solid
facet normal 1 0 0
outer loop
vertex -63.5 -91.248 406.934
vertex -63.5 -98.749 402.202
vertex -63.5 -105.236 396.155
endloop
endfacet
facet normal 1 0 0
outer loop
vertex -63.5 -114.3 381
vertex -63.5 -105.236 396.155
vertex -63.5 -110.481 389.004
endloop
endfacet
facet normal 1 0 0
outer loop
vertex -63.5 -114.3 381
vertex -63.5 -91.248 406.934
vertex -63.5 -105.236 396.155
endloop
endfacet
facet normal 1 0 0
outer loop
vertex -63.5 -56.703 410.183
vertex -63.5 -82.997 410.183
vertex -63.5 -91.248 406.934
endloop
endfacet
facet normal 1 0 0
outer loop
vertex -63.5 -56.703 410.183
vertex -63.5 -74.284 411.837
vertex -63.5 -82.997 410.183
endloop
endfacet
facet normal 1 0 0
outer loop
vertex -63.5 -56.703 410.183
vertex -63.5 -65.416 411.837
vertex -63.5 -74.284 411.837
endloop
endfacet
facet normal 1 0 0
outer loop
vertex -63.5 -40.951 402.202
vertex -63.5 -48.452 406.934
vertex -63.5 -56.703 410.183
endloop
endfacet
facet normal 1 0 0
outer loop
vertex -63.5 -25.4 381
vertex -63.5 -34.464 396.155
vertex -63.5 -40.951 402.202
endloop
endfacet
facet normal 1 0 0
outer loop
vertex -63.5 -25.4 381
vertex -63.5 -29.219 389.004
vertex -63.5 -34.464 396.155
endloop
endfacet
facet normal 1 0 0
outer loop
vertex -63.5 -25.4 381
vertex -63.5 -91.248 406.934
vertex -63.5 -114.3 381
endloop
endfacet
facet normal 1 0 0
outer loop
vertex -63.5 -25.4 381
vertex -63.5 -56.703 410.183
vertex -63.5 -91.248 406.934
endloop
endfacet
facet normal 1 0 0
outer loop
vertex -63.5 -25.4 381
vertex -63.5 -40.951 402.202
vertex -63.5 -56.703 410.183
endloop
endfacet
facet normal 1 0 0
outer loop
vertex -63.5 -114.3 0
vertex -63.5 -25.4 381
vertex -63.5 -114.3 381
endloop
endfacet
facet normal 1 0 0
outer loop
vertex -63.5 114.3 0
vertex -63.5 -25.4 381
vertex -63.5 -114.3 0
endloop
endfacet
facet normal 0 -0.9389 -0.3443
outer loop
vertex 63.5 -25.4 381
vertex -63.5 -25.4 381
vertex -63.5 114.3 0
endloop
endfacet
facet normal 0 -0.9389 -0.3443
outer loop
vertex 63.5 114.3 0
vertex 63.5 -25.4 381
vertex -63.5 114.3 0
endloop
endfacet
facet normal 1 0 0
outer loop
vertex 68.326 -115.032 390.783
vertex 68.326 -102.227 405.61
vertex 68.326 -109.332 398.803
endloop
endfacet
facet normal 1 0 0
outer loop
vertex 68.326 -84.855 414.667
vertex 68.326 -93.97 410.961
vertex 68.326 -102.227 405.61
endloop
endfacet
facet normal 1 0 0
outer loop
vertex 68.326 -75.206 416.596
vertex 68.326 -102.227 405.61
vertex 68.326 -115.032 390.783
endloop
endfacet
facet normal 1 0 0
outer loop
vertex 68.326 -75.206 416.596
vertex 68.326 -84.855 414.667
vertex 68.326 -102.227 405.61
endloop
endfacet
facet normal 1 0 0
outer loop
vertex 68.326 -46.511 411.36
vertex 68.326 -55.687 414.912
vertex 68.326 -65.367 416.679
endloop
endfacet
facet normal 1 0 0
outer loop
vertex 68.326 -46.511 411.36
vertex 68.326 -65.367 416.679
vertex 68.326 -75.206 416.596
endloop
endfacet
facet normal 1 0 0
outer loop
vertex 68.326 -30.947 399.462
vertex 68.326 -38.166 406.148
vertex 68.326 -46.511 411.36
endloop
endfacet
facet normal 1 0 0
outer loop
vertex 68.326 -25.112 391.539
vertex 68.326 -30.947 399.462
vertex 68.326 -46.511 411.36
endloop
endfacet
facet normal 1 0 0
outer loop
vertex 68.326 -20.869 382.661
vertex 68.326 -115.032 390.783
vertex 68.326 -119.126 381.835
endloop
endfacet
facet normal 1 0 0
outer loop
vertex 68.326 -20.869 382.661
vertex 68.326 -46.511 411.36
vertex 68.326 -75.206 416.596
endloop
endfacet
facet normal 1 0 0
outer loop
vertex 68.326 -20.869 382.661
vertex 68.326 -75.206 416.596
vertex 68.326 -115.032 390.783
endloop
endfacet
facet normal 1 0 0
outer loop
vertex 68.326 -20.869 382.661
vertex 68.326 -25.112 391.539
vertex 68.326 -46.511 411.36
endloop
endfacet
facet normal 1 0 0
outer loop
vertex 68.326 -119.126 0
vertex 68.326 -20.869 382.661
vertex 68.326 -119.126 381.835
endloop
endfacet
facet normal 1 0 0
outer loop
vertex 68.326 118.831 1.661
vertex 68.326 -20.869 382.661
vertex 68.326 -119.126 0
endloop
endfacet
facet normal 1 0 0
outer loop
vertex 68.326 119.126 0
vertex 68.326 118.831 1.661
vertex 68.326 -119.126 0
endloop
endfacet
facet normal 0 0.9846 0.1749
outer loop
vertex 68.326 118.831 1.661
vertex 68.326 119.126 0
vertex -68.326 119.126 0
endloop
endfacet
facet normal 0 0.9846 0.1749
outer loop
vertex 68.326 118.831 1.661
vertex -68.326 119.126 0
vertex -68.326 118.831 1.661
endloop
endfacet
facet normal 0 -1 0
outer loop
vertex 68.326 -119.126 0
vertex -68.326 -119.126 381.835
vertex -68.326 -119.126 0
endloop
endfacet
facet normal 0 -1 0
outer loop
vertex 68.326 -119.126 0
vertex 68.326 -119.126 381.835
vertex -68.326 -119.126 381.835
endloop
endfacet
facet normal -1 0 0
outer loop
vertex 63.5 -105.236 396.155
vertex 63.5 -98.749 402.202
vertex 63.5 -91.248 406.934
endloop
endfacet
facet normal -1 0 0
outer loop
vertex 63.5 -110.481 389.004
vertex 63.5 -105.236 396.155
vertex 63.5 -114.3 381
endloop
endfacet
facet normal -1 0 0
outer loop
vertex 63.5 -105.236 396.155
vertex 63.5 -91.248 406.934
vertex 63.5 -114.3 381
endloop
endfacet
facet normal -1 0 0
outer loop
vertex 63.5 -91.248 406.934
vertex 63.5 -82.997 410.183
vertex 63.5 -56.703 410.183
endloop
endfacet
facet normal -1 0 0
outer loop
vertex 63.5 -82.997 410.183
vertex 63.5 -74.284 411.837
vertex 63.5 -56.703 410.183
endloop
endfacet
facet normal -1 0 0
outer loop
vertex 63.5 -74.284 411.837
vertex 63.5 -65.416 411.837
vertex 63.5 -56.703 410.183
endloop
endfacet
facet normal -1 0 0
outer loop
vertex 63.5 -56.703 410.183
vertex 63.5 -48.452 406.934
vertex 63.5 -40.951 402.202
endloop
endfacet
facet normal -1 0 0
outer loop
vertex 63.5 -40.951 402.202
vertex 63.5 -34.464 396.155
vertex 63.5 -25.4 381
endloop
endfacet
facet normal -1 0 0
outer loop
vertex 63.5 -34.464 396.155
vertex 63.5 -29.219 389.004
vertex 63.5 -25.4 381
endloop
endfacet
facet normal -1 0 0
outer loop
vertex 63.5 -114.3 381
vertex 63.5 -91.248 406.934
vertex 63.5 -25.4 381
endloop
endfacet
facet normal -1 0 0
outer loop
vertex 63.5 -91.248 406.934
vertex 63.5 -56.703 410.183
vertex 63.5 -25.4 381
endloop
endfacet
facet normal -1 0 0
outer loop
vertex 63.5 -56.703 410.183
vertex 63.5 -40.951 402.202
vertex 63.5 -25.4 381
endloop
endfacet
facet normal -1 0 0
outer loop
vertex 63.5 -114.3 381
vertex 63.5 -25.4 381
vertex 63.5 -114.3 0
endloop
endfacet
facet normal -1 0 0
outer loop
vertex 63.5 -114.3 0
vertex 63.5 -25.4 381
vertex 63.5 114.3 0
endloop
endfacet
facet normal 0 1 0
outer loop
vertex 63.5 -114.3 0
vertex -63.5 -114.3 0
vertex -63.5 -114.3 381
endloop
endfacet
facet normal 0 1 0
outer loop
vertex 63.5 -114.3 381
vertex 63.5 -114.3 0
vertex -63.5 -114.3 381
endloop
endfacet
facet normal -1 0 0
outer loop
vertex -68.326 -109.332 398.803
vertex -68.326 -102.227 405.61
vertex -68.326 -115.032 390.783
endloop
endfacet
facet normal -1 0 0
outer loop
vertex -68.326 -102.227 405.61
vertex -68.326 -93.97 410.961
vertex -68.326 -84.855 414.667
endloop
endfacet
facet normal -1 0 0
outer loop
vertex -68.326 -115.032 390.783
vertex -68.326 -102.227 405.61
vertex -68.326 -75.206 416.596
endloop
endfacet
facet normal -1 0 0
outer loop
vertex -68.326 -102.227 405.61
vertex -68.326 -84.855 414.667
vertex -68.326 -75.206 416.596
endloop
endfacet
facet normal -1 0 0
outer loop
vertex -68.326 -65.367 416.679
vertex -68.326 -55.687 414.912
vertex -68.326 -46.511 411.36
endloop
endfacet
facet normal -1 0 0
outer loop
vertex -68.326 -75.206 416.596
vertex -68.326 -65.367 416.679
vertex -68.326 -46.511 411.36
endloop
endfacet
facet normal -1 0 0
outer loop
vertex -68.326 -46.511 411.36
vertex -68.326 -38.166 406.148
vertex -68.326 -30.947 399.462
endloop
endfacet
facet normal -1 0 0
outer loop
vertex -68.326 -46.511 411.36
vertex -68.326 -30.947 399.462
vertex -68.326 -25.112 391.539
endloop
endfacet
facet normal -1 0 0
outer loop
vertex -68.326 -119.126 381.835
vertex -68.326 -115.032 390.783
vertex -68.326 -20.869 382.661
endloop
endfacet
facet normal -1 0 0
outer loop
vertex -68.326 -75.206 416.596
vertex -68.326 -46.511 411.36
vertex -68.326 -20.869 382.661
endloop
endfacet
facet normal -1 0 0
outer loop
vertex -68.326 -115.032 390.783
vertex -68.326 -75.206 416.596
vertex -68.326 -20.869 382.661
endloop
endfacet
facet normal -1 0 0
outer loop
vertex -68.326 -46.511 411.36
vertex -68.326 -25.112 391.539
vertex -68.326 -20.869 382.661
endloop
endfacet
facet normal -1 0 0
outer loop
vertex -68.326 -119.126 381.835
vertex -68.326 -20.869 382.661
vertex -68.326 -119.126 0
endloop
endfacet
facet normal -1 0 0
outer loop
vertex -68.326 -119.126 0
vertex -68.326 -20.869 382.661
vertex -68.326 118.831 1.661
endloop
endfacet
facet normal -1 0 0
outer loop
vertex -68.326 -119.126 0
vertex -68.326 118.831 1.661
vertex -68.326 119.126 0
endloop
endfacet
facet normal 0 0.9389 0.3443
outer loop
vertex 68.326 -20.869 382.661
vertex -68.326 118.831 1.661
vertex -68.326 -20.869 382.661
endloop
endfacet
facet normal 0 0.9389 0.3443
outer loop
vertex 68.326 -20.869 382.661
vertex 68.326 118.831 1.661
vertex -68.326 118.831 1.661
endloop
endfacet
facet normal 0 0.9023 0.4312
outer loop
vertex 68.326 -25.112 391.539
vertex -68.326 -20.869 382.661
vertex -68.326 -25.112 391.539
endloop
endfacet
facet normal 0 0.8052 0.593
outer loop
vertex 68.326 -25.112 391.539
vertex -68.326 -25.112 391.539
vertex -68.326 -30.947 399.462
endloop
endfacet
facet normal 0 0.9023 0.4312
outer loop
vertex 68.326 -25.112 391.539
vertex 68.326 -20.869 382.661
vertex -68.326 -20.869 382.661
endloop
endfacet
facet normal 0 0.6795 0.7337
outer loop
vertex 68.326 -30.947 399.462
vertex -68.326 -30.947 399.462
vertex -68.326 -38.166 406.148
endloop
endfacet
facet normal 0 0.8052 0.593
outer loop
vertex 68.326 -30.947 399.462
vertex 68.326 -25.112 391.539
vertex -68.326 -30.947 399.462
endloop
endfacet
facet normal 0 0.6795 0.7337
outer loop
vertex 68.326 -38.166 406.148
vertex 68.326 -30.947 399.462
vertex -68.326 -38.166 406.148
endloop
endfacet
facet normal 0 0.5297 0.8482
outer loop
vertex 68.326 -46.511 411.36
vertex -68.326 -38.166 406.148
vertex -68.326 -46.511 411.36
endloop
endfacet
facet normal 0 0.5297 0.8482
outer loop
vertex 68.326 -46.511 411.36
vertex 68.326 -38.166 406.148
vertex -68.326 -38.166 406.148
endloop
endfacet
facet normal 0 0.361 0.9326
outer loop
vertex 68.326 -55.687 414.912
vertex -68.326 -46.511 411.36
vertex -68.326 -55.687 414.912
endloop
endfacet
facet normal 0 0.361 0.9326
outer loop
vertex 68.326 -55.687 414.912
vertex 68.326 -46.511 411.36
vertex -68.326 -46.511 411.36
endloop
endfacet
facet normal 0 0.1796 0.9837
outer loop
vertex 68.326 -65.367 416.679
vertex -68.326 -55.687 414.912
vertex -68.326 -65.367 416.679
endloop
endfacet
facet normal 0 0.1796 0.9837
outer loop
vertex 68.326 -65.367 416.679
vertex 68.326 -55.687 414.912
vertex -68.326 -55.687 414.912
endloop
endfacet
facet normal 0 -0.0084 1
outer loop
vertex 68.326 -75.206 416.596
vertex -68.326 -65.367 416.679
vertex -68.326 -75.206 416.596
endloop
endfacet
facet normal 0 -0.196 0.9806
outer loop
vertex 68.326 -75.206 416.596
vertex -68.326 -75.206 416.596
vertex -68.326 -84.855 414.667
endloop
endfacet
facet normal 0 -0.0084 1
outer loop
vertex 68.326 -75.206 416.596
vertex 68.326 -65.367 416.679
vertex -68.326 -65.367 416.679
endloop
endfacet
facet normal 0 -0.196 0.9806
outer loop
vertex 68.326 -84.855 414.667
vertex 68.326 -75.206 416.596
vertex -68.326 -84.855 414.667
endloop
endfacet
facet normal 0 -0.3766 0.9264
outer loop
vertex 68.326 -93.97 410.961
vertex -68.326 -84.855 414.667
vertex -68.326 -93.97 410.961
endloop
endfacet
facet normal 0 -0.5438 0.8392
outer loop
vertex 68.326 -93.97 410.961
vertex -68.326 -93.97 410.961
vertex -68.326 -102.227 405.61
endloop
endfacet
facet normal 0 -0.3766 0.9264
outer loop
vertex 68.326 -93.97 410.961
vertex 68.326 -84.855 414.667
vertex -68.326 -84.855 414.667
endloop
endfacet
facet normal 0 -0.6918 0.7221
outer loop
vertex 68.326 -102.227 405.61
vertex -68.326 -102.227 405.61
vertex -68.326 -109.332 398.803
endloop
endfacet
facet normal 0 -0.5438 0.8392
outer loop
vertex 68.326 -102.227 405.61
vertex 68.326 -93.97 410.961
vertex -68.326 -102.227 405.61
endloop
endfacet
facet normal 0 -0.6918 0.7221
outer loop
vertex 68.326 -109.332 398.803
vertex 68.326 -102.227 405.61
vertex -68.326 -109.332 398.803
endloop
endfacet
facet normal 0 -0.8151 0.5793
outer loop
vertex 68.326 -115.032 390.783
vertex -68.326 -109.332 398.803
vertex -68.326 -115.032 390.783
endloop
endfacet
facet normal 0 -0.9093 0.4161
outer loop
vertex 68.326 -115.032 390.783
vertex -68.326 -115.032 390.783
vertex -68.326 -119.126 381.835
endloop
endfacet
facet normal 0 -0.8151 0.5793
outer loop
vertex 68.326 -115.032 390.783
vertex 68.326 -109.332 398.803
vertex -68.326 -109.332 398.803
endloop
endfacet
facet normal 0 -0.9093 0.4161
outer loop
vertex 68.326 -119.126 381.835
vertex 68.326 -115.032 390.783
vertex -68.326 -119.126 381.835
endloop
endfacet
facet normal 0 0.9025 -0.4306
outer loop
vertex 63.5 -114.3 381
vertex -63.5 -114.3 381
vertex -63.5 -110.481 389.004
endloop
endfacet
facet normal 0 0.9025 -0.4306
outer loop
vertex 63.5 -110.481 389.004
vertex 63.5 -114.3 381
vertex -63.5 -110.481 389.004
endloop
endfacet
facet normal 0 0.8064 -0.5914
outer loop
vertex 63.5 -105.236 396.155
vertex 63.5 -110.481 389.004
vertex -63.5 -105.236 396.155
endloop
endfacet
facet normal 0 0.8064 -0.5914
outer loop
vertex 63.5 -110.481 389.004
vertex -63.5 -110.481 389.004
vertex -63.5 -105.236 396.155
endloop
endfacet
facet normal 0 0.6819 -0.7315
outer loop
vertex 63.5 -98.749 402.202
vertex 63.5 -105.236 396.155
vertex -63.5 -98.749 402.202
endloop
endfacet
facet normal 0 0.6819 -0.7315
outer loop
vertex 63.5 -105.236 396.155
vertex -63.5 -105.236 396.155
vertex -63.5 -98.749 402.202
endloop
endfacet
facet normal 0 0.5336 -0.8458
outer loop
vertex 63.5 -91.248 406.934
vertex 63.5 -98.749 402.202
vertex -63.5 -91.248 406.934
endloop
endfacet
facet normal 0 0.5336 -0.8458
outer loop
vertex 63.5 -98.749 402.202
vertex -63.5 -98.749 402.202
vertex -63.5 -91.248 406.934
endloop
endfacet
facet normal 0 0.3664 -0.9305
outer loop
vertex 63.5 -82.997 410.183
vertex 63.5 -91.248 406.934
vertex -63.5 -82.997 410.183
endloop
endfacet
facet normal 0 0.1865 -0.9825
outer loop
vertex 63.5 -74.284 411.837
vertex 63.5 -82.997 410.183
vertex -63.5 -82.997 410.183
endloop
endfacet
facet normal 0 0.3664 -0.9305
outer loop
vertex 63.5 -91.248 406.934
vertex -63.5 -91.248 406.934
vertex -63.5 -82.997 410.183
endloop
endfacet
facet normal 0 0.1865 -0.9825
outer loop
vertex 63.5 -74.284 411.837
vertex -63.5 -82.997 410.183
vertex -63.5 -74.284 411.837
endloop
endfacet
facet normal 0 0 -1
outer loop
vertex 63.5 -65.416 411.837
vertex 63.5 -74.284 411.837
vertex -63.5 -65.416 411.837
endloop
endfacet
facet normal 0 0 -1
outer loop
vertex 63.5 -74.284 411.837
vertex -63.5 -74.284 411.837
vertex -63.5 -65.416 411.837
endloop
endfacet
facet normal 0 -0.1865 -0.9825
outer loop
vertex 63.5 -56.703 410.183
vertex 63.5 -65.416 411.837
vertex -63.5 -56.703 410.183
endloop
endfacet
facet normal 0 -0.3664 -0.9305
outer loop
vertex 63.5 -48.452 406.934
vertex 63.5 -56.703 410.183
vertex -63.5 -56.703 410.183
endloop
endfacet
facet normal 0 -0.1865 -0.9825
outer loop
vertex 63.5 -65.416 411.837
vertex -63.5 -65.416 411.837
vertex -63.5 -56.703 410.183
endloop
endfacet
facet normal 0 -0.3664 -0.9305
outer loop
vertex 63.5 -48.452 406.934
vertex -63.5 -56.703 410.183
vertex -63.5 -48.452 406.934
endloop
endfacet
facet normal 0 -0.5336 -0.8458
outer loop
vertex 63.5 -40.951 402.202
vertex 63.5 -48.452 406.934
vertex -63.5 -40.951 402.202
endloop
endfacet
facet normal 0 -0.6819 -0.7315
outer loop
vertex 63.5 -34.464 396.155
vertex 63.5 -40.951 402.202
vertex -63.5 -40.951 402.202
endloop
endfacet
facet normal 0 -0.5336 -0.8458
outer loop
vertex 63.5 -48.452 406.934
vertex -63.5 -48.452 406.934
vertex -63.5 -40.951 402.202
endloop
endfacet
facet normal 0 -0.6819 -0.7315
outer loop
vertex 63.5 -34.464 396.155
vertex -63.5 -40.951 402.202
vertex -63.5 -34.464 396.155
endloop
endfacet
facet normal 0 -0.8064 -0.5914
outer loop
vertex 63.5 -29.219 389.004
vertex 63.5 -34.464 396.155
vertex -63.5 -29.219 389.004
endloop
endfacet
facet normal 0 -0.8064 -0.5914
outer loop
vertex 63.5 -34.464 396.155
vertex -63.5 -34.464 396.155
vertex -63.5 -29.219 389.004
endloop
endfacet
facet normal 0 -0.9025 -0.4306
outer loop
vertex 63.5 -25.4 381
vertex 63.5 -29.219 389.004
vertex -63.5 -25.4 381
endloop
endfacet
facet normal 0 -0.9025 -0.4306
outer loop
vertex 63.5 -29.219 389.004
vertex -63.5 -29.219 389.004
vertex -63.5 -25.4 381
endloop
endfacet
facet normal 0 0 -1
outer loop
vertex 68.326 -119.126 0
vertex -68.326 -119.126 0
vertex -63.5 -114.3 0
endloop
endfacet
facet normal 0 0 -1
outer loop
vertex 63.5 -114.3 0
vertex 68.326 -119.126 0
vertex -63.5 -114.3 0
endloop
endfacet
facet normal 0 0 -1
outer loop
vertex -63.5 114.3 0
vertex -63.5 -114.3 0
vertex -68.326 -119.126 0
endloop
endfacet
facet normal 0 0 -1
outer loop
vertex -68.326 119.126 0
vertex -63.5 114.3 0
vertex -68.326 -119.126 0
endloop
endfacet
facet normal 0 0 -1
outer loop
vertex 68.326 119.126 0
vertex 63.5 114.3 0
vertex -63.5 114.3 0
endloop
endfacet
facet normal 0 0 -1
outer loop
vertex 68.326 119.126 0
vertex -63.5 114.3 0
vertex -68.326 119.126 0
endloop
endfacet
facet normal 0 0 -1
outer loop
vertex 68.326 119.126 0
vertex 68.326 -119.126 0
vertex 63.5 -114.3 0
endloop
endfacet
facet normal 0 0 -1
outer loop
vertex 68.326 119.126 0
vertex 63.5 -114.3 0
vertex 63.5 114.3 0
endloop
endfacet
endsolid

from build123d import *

# Parameters (mm, degrees)
BOSS_EXTRUDE1_DEPTH      = 63.5
BOSS_EXTRUDE1_DEPTH_BACK = 63.5
BOSS_EXTRUDE2_DEPTH      = 4.826


with BuildPart() as part:
    # Sketch1 → Boss-Extrude1 (new, two sides: drawn at the far end of the back side and taken through both)
    with BuildSketch(Plane(origin=(0, 0, 0), x_dir=(0, 0, -1), z_dir=(1, 0, 0)).offset(-BOSS_EXTRUDE1_DEPTH_BACK)):
        with BuildLine():
            Line((0, -114.3), (-381, -114.3))
            ThreePointArc((-381, -114.3), (-412.045495931, -69.85), (-381, -25.4))
            Line((-381, -25.4), (0, 114.3))
            Line((0, 114.3), (0, 119.126))
            Line((0, 119.126), (-1.661372937, 118.8310171))
            Line((-1.661372937, 118.8310171), (-382.661372937, -20.8689829))
            ThreePointArc((-382.661372937, -20.8689829), (-416.86965301, -70.288504669), (-381.835461036, -119.126))
            Line((-381.835461036, -119.126), (0, -119.126))
            Line((0, -119.126), (0, -114.3))
        make_face()
    extrude(amount=BOSS_EXTRUDE1_DEPTH + BOSS_EXTRUDE1_DEPTH_BACK)

    # Sketch2 → Boss-Extrude2 (add)
    with BuildSketch(Plane(origin=(63.5, 0, 0), x_dir=(0, 0, -1), z_dir=(1, 0, 0))):
        with BuildLine():
            Line((-381.835461036, -119.126), (0, -119.126))
            Line((0, -119.126), (0, 119.126))
            Line((0, 119.126), (-1.661372937, 118.8310171))
            Line((-1.661372937, 118.8310171), (-382.661372937, -20.8689829))
            ThreePointArc((-382.661372937, -20.8689829), (-416.86965301, -70.288504669), (-381.835461036, -119.126))
        make_face()
    boss_extrude2 = extrude(amount=BOSS_EXTRUDE2_DEPTH)

    # Mirror1: Boss-Extrude2 across plane
    add(boss_extrude2.mirror(Plane(origin=(0, 0, 0), x_dir=(0, 0, 1), z_dir=(1, 0, 0))))


solid = part.part
